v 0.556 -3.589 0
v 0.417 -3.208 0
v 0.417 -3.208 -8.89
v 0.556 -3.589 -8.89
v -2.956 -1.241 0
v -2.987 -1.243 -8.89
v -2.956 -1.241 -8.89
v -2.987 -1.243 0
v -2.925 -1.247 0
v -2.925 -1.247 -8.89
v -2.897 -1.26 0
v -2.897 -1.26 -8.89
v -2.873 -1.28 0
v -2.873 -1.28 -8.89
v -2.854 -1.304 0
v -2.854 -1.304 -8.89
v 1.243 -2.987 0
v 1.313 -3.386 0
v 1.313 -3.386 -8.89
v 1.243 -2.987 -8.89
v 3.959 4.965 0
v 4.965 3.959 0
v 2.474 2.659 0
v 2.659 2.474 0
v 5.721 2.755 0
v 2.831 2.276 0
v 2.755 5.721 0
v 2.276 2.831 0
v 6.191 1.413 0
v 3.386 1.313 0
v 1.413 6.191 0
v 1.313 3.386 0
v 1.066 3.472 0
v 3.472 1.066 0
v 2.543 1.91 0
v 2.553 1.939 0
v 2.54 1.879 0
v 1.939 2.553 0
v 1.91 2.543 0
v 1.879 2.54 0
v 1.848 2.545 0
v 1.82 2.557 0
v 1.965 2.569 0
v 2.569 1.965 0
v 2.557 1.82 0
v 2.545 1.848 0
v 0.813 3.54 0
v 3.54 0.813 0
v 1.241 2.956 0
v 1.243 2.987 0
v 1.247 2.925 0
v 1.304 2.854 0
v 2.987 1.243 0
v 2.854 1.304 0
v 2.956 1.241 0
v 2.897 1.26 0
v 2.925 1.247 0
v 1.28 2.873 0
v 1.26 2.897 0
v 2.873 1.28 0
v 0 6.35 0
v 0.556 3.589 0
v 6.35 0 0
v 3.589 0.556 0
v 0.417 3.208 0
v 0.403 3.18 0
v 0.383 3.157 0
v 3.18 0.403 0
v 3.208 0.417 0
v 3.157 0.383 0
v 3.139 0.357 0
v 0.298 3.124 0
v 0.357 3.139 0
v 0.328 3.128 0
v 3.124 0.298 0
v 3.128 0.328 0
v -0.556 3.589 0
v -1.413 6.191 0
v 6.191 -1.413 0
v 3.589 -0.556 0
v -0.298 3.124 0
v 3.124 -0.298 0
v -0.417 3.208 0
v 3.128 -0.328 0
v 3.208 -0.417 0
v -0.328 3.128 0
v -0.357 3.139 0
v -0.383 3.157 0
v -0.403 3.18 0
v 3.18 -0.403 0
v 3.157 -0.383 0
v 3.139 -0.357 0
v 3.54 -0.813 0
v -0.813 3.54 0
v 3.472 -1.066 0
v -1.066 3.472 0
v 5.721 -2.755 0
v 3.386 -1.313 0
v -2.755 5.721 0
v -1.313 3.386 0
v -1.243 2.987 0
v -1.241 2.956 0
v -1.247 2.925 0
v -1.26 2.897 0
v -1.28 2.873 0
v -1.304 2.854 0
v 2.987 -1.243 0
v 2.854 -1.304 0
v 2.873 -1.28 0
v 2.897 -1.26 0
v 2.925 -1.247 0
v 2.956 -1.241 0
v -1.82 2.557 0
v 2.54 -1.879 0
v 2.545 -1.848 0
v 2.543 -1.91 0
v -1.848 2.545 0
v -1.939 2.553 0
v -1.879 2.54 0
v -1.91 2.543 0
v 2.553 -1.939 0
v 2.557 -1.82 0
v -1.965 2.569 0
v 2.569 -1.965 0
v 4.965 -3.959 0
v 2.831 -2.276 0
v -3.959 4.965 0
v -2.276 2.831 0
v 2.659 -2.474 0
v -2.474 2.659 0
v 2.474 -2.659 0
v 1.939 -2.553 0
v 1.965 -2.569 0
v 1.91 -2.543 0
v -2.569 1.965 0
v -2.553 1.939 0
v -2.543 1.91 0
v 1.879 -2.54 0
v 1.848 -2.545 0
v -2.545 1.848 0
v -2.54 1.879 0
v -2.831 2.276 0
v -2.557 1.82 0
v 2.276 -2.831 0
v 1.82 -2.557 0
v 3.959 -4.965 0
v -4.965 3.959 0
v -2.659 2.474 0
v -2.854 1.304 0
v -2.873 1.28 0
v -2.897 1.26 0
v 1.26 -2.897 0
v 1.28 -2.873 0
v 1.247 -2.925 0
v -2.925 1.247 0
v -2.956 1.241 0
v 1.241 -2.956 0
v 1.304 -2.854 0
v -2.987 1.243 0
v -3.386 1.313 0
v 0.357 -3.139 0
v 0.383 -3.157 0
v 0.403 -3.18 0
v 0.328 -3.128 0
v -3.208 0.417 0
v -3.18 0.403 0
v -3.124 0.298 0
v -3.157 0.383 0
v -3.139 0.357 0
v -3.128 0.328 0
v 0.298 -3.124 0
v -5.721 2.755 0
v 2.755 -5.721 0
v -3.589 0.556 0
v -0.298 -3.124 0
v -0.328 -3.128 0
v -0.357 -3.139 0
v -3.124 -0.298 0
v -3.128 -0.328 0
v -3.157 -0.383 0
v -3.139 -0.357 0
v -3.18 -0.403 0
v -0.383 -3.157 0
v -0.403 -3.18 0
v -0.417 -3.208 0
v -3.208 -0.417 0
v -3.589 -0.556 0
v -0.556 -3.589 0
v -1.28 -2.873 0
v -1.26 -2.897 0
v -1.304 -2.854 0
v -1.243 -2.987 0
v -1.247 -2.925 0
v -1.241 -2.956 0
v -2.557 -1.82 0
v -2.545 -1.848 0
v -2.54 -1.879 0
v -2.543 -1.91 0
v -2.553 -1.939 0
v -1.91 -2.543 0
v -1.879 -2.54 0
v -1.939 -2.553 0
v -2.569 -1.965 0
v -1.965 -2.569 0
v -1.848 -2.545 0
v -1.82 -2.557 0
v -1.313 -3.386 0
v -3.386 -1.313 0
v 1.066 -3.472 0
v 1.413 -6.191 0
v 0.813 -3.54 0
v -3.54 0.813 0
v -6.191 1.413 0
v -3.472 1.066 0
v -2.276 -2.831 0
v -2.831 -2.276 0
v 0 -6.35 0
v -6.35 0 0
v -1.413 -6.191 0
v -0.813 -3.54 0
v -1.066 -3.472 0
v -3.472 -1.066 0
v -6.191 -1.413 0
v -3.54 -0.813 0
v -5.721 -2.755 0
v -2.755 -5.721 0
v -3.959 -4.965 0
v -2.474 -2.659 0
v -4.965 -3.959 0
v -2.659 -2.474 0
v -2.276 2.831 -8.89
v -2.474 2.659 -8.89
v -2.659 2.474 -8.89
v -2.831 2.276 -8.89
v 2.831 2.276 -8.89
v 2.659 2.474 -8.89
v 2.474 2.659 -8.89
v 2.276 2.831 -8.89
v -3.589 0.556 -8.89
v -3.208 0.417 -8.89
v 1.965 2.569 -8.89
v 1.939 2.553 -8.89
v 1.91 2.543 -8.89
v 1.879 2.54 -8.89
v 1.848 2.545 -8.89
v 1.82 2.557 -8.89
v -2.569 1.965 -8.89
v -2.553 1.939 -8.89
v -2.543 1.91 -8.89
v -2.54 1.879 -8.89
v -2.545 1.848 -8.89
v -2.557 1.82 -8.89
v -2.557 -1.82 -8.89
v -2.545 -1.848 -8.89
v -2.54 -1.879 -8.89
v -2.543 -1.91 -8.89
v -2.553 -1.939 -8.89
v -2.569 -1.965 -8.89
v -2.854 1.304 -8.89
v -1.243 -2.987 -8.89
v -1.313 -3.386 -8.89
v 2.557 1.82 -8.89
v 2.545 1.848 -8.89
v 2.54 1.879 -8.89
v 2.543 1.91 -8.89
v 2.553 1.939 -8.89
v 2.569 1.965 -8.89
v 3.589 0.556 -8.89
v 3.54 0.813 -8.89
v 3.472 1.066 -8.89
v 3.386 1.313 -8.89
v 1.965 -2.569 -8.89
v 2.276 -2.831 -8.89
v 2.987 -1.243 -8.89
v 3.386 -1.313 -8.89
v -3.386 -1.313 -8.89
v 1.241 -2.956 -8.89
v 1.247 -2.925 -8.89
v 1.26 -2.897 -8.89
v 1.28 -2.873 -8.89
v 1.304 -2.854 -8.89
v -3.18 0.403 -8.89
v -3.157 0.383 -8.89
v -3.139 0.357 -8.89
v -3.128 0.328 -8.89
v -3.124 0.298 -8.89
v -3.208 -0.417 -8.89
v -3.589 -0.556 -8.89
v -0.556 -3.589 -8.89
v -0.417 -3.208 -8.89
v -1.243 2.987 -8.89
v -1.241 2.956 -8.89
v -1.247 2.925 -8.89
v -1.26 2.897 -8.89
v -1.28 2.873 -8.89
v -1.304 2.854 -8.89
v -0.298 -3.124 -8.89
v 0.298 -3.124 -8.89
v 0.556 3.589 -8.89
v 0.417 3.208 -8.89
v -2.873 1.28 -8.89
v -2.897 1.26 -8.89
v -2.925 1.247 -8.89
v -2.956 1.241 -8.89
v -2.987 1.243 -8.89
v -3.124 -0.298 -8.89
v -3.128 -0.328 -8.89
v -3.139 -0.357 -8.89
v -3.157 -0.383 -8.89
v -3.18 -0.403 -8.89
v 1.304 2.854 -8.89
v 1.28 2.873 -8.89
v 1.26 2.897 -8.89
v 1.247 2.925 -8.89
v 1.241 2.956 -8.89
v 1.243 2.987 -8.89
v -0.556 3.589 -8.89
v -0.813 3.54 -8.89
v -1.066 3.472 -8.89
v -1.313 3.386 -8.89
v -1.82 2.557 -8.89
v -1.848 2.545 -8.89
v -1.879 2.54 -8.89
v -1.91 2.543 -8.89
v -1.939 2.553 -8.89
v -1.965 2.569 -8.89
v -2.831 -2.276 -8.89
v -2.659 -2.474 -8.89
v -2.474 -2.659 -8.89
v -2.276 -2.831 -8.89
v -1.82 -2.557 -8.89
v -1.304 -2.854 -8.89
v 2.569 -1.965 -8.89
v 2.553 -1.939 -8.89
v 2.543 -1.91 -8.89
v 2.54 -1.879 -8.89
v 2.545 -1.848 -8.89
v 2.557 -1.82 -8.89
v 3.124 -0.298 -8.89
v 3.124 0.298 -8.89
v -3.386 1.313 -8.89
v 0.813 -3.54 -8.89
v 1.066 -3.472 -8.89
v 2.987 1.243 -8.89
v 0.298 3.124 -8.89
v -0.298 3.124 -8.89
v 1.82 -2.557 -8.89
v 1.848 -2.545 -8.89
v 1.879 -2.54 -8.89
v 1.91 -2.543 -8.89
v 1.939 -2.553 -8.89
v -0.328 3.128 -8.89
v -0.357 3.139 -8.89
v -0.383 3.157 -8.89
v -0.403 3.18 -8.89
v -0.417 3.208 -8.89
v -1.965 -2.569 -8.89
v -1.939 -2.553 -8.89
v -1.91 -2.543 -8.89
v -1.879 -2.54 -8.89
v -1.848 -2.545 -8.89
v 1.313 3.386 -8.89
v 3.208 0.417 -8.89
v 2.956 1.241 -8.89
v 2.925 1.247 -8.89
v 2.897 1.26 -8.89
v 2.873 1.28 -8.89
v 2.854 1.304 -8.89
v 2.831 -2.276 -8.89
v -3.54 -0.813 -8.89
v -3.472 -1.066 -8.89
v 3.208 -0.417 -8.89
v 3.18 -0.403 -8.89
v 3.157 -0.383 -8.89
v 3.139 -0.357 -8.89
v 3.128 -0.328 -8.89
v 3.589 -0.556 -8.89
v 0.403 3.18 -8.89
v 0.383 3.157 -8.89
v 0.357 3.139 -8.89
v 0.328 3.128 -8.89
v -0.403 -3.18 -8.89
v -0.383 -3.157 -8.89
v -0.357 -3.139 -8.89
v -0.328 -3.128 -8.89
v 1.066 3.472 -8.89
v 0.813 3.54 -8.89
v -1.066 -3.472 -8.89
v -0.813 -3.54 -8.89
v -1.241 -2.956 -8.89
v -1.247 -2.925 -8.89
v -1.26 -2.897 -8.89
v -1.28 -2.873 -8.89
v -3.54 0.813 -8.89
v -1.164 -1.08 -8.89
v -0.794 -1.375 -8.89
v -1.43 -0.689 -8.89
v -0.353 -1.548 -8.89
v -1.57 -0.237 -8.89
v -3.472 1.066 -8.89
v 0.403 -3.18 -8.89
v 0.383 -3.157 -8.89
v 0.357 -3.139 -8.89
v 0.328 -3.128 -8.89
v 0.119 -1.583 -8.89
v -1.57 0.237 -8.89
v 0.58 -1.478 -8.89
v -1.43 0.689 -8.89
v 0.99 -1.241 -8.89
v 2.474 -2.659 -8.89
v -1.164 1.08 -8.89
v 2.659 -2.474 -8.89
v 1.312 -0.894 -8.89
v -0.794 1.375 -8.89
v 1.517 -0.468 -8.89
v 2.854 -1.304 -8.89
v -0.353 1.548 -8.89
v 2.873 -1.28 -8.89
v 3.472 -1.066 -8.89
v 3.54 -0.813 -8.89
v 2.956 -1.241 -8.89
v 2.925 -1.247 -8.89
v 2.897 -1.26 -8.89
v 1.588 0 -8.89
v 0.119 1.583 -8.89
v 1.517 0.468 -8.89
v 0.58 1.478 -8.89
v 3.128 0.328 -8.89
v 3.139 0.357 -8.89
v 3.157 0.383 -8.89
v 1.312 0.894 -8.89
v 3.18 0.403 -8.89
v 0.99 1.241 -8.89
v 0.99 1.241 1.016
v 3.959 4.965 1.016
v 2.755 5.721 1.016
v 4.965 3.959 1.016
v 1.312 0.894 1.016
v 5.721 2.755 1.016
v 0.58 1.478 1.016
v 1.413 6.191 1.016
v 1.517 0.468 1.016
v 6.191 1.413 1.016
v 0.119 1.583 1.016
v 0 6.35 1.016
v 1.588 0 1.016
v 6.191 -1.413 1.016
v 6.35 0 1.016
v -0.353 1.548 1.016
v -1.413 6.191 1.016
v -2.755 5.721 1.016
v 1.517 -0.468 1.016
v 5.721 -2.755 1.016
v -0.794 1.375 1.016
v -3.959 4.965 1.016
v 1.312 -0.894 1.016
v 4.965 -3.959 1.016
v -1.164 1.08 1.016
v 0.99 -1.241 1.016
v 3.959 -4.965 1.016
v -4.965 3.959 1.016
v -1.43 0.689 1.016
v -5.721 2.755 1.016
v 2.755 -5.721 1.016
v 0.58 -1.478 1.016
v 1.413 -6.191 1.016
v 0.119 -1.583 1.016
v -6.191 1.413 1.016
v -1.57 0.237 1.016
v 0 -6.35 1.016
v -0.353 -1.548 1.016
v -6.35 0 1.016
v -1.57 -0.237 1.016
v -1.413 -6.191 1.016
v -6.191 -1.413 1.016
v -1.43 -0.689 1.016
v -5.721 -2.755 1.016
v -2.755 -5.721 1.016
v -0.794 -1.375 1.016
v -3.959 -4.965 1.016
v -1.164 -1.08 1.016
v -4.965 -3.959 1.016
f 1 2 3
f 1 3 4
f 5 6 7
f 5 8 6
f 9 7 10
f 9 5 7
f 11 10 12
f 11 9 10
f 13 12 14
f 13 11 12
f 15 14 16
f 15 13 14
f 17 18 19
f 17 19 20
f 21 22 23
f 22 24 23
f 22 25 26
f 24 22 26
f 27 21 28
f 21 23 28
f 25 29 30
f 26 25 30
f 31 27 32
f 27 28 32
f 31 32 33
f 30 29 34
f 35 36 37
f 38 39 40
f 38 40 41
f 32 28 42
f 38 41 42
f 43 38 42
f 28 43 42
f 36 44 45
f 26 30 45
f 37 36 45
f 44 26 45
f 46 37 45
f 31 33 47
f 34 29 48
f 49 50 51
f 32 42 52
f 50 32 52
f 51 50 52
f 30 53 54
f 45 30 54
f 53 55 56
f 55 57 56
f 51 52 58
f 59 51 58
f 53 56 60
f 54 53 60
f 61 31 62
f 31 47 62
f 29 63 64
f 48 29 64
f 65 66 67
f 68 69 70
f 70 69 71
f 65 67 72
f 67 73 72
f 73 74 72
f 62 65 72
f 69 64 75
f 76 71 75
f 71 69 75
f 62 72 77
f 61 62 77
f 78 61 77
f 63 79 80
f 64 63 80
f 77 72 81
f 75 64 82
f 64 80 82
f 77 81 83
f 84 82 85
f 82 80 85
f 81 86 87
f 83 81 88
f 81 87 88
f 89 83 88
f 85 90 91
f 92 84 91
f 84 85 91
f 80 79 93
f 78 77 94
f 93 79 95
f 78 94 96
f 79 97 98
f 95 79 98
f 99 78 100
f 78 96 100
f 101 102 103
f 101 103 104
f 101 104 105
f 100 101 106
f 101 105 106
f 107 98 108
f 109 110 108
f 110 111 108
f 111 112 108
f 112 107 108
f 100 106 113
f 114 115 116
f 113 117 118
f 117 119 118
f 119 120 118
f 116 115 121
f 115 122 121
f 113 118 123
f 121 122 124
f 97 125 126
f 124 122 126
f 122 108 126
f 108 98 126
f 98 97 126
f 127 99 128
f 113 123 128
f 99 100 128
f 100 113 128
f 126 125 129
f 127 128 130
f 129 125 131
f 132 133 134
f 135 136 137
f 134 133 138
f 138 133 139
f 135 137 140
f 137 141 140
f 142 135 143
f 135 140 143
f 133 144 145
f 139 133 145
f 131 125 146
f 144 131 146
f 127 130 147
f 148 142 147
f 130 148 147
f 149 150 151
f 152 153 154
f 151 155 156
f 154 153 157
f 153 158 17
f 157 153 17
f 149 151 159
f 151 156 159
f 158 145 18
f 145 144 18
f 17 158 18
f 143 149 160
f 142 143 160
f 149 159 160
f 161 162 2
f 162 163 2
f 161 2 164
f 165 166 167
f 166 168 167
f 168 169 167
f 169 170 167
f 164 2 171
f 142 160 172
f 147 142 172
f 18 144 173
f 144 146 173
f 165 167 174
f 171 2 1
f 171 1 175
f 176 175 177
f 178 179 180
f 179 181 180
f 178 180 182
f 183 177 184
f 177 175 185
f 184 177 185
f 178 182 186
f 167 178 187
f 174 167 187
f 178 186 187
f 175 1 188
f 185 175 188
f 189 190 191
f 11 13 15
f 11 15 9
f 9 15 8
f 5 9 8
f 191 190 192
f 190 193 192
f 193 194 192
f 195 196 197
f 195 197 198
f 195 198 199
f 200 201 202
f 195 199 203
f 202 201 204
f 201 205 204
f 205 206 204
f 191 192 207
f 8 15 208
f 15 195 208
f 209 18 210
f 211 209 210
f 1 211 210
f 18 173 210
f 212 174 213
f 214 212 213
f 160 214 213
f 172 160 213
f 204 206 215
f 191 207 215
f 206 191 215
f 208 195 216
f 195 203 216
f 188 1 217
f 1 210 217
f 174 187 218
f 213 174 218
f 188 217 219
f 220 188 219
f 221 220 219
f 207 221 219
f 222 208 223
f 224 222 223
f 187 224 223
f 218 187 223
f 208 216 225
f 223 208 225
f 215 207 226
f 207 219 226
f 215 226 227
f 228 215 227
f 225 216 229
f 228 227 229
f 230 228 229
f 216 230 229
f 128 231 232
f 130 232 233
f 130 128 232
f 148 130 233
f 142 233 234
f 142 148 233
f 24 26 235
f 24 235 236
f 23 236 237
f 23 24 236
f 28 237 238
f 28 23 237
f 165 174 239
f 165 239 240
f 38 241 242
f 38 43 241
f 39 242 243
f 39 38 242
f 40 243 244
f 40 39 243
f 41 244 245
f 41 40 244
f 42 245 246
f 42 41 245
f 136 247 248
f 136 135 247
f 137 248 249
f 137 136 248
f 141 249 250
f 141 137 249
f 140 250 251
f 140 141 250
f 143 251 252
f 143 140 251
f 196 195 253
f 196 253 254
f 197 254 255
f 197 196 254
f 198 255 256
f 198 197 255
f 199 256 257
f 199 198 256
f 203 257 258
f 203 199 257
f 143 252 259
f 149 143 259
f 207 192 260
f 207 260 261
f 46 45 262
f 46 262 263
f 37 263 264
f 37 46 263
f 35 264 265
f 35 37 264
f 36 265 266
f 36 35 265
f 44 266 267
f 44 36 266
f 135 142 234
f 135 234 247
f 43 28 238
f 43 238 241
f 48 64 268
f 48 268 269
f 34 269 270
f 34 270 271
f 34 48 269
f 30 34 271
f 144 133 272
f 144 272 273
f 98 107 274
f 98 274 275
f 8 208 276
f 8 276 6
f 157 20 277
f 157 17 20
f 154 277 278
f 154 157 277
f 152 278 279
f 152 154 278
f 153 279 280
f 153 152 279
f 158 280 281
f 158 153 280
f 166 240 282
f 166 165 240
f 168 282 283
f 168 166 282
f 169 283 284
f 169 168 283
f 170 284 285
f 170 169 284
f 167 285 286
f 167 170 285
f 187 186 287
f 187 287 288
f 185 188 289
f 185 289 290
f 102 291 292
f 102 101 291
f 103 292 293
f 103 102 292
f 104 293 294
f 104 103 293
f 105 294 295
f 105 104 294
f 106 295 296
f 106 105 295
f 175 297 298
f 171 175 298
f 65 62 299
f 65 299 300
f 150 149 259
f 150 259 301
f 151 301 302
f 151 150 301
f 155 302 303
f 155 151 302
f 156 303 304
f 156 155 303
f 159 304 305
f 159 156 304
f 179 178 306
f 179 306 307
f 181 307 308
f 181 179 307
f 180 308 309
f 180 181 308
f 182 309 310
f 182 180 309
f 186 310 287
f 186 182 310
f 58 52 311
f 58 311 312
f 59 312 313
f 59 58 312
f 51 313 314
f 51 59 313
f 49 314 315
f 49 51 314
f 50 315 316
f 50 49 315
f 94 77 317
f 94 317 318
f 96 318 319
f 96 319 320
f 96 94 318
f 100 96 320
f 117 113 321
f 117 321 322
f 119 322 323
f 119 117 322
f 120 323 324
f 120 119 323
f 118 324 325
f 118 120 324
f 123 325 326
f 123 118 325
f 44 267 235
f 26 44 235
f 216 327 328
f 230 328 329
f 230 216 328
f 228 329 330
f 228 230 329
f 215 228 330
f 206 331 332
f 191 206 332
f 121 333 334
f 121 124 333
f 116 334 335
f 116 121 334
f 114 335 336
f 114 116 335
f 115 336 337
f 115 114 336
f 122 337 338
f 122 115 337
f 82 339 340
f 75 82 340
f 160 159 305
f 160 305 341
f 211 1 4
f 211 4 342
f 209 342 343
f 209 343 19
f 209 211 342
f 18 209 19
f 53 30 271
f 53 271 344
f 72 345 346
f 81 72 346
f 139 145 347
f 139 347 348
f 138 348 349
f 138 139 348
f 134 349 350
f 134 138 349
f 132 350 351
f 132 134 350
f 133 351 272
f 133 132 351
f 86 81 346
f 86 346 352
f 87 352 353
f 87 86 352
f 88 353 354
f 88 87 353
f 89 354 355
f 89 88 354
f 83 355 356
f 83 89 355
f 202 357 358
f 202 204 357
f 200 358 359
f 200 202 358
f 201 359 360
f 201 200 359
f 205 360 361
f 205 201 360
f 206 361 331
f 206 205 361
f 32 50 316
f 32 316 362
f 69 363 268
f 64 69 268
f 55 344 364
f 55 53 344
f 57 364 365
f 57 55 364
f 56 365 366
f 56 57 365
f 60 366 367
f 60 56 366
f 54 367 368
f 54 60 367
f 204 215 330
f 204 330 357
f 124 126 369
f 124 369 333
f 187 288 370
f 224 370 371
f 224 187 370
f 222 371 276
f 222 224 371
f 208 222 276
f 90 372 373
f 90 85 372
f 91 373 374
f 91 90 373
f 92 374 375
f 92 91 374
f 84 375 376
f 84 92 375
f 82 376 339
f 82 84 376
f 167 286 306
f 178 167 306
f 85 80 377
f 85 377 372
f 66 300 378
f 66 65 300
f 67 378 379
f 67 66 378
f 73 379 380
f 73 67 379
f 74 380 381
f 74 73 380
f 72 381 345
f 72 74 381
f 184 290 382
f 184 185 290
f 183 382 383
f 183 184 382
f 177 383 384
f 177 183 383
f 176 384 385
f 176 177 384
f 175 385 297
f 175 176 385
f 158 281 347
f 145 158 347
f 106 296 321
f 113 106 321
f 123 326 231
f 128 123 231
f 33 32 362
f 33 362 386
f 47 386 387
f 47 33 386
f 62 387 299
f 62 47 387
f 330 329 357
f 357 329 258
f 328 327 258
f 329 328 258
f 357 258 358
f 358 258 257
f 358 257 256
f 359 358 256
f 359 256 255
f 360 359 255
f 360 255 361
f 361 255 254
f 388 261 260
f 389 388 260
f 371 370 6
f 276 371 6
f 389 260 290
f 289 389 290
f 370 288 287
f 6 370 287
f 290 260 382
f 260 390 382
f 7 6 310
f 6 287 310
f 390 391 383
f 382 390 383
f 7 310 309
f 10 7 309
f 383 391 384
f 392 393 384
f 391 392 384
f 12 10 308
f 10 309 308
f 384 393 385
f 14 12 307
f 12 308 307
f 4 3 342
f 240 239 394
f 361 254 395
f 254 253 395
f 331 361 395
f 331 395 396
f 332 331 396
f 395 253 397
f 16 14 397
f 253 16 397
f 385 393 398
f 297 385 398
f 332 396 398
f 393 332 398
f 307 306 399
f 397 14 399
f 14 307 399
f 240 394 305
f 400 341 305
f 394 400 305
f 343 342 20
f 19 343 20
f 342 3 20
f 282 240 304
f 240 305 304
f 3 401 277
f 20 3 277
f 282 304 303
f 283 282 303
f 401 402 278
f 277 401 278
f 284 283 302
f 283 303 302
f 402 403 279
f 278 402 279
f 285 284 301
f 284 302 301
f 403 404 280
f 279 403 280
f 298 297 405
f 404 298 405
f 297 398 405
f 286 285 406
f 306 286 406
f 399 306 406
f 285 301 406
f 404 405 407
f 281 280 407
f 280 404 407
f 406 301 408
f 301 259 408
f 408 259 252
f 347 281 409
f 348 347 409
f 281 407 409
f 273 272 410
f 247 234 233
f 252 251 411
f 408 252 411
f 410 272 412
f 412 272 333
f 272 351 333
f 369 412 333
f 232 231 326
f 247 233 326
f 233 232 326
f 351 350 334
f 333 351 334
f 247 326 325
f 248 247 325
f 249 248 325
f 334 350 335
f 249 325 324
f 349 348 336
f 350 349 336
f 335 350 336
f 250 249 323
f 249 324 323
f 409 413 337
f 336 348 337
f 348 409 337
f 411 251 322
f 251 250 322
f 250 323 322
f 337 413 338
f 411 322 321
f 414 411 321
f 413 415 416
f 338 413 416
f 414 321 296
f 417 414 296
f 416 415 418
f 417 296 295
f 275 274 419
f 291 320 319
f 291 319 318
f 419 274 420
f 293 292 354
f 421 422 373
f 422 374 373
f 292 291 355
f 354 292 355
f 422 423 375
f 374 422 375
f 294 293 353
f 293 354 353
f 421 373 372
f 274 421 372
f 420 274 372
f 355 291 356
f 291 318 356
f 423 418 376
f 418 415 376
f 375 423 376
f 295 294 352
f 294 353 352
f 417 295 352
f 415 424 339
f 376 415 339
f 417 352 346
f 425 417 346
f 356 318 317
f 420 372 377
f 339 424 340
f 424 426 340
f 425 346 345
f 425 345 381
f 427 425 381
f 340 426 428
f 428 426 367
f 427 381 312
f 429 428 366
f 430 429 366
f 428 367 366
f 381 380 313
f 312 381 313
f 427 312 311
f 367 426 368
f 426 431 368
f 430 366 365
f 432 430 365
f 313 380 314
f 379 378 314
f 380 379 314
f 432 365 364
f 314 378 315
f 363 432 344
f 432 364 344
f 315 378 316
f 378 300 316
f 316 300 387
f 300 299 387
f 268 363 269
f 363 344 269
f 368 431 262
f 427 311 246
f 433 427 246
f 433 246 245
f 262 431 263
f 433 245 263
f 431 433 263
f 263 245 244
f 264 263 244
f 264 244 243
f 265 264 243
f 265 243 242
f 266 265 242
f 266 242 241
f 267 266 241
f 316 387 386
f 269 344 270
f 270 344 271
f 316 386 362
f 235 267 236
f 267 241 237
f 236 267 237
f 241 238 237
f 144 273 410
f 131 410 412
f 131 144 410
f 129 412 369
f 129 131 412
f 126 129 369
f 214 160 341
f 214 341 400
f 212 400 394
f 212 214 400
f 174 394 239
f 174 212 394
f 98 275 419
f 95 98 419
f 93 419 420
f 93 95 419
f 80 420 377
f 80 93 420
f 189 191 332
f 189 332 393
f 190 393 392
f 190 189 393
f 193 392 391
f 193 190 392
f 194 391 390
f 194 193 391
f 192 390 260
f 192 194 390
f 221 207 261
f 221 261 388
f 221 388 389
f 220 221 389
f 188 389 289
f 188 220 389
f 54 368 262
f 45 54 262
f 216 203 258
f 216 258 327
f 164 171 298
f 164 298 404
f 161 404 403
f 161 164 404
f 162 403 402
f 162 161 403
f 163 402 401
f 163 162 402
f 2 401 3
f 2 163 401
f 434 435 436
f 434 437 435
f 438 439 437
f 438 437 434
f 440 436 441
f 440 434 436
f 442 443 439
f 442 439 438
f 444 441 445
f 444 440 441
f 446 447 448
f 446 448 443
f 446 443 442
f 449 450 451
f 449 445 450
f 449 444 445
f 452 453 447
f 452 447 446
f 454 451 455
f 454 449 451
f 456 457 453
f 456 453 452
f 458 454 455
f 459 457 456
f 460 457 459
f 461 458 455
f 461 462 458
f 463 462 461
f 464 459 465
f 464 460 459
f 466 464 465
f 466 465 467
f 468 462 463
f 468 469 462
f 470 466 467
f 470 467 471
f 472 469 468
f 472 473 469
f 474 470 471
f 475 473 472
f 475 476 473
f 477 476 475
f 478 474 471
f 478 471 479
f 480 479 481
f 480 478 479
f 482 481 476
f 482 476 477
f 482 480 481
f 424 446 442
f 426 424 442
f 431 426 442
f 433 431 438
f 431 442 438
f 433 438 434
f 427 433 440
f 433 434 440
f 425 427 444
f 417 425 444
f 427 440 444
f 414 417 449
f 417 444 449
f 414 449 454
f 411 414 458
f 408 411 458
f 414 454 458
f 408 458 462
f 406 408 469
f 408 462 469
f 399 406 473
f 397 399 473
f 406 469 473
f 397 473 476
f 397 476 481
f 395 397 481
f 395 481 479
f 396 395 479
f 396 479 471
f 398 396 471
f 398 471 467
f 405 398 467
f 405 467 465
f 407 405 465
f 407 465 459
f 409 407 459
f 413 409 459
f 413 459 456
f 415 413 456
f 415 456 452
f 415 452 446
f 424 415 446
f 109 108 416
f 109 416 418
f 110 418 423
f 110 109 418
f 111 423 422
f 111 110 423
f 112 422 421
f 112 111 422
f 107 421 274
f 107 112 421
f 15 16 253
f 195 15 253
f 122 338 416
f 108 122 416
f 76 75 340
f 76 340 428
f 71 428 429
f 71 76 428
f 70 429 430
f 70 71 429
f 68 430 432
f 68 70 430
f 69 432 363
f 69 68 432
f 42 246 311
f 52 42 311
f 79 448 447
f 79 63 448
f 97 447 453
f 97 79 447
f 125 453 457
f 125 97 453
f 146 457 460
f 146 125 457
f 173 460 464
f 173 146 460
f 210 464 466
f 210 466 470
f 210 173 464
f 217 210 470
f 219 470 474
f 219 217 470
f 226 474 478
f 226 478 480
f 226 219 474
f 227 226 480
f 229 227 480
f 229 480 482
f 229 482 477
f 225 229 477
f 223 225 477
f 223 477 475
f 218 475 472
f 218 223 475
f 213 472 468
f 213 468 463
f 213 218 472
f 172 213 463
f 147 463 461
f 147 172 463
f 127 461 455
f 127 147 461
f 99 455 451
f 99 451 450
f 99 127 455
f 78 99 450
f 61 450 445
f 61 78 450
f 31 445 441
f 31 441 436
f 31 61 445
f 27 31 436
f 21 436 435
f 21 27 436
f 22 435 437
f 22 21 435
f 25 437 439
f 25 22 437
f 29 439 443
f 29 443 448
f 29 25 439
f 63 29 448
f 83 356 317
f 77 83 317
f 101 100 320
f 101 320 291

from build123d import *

# Parameters (mm, degrees)
SKETCH1_R        = 3.6322
BASEPULLEY_DEPTH = 8.89
GROOVE_DEPTH     = 4.445
GROOVES_COUNT    = 12
GROOVES_ANGLE    = 330
SKETCH4_W        = 1.016
SKETCH4_H        = 6.35
BORSKE_R         = 1.5875
BORE_DEPTH       = 14.370633343


with BuildPart() as part:
    # Sketch1 → BasePulley (new body)
    with BuildSketch(Plane.XY):
        Circle(SKETCH1_R)
    extrude(amount=-BASEPULLEY_DEPTH)

    # Sketch3 → Groove (cut, symmetric)
    with BuildSketch(Plane.XY.offset(-4.445)):
        with BuildLine():
            Line((-0.5715, 3.6322), (-0.5715, 29.0322))
            Line((-0.5715, 29.0322), (0.5715, 29.0322))
            Line((0.5715, 29.0322), (0.5715, 3.6322))
            Line((0.5715, 3.6322), (0.417017726, 3.207763442))
            ThreePointArc((0.417017726, 3.207763442), (0.370520971, 3.14716769), (0.297676764, 3.1242))
            Line((0.297676764, 3.1242), (-0.297676764, 3.1242))
            ThreePointArc((-0.297676764, 3.1242), (-0.370520971, 3.14716769), (-0.417017726, 3.207763442))
            Line((-0.417017726, 3.207763442), (-0.5715, 3.6322))
        make_face()
    groove = extrude(amount=GROOVE_DEPTH, both=True, mode=Mode.SUBTRACT)

    # Grooves: Groove ×12 about axis
    grooves_axis = Axis((0, 0, -8.89), (0, 0, 1))
    for i in range(1, GROOVES_COUNT):
        add(groove.rotate(grooves_axis, i * GROOVES_ANGLE / (GROOVES_COUNT - 1)), mode=Mode.SUBTRACT)

    # Sketch4 → BaseHub (revolve)
    with BuildSketch(Plane(origin=(0, 0, 0), x_dir=(0, 0, -1), z_dir=(1, 0, 0)), mode=Mode.PRIVATE) as basehub_sk:
        with Locations((-0.508, 3.175)):
            Rectangle(SKETCH4_W, SKETCH4_H)
    revolve(basehub_sk.sketch.rotate(Axis((0, 0, 0), (0, 0, -1)), 90), axis=Axis((0, 0, 0), (0, 0, -1)))

    # BorSke → Bore (cut, through all)
    with BuildSketch(Plane.XY.offset(1.016)):
        Circle(BORSKE_R)
    extrude(amount=-BORE_DEPTH, mode=Mode.SUBTRACT)


solid = part.part
